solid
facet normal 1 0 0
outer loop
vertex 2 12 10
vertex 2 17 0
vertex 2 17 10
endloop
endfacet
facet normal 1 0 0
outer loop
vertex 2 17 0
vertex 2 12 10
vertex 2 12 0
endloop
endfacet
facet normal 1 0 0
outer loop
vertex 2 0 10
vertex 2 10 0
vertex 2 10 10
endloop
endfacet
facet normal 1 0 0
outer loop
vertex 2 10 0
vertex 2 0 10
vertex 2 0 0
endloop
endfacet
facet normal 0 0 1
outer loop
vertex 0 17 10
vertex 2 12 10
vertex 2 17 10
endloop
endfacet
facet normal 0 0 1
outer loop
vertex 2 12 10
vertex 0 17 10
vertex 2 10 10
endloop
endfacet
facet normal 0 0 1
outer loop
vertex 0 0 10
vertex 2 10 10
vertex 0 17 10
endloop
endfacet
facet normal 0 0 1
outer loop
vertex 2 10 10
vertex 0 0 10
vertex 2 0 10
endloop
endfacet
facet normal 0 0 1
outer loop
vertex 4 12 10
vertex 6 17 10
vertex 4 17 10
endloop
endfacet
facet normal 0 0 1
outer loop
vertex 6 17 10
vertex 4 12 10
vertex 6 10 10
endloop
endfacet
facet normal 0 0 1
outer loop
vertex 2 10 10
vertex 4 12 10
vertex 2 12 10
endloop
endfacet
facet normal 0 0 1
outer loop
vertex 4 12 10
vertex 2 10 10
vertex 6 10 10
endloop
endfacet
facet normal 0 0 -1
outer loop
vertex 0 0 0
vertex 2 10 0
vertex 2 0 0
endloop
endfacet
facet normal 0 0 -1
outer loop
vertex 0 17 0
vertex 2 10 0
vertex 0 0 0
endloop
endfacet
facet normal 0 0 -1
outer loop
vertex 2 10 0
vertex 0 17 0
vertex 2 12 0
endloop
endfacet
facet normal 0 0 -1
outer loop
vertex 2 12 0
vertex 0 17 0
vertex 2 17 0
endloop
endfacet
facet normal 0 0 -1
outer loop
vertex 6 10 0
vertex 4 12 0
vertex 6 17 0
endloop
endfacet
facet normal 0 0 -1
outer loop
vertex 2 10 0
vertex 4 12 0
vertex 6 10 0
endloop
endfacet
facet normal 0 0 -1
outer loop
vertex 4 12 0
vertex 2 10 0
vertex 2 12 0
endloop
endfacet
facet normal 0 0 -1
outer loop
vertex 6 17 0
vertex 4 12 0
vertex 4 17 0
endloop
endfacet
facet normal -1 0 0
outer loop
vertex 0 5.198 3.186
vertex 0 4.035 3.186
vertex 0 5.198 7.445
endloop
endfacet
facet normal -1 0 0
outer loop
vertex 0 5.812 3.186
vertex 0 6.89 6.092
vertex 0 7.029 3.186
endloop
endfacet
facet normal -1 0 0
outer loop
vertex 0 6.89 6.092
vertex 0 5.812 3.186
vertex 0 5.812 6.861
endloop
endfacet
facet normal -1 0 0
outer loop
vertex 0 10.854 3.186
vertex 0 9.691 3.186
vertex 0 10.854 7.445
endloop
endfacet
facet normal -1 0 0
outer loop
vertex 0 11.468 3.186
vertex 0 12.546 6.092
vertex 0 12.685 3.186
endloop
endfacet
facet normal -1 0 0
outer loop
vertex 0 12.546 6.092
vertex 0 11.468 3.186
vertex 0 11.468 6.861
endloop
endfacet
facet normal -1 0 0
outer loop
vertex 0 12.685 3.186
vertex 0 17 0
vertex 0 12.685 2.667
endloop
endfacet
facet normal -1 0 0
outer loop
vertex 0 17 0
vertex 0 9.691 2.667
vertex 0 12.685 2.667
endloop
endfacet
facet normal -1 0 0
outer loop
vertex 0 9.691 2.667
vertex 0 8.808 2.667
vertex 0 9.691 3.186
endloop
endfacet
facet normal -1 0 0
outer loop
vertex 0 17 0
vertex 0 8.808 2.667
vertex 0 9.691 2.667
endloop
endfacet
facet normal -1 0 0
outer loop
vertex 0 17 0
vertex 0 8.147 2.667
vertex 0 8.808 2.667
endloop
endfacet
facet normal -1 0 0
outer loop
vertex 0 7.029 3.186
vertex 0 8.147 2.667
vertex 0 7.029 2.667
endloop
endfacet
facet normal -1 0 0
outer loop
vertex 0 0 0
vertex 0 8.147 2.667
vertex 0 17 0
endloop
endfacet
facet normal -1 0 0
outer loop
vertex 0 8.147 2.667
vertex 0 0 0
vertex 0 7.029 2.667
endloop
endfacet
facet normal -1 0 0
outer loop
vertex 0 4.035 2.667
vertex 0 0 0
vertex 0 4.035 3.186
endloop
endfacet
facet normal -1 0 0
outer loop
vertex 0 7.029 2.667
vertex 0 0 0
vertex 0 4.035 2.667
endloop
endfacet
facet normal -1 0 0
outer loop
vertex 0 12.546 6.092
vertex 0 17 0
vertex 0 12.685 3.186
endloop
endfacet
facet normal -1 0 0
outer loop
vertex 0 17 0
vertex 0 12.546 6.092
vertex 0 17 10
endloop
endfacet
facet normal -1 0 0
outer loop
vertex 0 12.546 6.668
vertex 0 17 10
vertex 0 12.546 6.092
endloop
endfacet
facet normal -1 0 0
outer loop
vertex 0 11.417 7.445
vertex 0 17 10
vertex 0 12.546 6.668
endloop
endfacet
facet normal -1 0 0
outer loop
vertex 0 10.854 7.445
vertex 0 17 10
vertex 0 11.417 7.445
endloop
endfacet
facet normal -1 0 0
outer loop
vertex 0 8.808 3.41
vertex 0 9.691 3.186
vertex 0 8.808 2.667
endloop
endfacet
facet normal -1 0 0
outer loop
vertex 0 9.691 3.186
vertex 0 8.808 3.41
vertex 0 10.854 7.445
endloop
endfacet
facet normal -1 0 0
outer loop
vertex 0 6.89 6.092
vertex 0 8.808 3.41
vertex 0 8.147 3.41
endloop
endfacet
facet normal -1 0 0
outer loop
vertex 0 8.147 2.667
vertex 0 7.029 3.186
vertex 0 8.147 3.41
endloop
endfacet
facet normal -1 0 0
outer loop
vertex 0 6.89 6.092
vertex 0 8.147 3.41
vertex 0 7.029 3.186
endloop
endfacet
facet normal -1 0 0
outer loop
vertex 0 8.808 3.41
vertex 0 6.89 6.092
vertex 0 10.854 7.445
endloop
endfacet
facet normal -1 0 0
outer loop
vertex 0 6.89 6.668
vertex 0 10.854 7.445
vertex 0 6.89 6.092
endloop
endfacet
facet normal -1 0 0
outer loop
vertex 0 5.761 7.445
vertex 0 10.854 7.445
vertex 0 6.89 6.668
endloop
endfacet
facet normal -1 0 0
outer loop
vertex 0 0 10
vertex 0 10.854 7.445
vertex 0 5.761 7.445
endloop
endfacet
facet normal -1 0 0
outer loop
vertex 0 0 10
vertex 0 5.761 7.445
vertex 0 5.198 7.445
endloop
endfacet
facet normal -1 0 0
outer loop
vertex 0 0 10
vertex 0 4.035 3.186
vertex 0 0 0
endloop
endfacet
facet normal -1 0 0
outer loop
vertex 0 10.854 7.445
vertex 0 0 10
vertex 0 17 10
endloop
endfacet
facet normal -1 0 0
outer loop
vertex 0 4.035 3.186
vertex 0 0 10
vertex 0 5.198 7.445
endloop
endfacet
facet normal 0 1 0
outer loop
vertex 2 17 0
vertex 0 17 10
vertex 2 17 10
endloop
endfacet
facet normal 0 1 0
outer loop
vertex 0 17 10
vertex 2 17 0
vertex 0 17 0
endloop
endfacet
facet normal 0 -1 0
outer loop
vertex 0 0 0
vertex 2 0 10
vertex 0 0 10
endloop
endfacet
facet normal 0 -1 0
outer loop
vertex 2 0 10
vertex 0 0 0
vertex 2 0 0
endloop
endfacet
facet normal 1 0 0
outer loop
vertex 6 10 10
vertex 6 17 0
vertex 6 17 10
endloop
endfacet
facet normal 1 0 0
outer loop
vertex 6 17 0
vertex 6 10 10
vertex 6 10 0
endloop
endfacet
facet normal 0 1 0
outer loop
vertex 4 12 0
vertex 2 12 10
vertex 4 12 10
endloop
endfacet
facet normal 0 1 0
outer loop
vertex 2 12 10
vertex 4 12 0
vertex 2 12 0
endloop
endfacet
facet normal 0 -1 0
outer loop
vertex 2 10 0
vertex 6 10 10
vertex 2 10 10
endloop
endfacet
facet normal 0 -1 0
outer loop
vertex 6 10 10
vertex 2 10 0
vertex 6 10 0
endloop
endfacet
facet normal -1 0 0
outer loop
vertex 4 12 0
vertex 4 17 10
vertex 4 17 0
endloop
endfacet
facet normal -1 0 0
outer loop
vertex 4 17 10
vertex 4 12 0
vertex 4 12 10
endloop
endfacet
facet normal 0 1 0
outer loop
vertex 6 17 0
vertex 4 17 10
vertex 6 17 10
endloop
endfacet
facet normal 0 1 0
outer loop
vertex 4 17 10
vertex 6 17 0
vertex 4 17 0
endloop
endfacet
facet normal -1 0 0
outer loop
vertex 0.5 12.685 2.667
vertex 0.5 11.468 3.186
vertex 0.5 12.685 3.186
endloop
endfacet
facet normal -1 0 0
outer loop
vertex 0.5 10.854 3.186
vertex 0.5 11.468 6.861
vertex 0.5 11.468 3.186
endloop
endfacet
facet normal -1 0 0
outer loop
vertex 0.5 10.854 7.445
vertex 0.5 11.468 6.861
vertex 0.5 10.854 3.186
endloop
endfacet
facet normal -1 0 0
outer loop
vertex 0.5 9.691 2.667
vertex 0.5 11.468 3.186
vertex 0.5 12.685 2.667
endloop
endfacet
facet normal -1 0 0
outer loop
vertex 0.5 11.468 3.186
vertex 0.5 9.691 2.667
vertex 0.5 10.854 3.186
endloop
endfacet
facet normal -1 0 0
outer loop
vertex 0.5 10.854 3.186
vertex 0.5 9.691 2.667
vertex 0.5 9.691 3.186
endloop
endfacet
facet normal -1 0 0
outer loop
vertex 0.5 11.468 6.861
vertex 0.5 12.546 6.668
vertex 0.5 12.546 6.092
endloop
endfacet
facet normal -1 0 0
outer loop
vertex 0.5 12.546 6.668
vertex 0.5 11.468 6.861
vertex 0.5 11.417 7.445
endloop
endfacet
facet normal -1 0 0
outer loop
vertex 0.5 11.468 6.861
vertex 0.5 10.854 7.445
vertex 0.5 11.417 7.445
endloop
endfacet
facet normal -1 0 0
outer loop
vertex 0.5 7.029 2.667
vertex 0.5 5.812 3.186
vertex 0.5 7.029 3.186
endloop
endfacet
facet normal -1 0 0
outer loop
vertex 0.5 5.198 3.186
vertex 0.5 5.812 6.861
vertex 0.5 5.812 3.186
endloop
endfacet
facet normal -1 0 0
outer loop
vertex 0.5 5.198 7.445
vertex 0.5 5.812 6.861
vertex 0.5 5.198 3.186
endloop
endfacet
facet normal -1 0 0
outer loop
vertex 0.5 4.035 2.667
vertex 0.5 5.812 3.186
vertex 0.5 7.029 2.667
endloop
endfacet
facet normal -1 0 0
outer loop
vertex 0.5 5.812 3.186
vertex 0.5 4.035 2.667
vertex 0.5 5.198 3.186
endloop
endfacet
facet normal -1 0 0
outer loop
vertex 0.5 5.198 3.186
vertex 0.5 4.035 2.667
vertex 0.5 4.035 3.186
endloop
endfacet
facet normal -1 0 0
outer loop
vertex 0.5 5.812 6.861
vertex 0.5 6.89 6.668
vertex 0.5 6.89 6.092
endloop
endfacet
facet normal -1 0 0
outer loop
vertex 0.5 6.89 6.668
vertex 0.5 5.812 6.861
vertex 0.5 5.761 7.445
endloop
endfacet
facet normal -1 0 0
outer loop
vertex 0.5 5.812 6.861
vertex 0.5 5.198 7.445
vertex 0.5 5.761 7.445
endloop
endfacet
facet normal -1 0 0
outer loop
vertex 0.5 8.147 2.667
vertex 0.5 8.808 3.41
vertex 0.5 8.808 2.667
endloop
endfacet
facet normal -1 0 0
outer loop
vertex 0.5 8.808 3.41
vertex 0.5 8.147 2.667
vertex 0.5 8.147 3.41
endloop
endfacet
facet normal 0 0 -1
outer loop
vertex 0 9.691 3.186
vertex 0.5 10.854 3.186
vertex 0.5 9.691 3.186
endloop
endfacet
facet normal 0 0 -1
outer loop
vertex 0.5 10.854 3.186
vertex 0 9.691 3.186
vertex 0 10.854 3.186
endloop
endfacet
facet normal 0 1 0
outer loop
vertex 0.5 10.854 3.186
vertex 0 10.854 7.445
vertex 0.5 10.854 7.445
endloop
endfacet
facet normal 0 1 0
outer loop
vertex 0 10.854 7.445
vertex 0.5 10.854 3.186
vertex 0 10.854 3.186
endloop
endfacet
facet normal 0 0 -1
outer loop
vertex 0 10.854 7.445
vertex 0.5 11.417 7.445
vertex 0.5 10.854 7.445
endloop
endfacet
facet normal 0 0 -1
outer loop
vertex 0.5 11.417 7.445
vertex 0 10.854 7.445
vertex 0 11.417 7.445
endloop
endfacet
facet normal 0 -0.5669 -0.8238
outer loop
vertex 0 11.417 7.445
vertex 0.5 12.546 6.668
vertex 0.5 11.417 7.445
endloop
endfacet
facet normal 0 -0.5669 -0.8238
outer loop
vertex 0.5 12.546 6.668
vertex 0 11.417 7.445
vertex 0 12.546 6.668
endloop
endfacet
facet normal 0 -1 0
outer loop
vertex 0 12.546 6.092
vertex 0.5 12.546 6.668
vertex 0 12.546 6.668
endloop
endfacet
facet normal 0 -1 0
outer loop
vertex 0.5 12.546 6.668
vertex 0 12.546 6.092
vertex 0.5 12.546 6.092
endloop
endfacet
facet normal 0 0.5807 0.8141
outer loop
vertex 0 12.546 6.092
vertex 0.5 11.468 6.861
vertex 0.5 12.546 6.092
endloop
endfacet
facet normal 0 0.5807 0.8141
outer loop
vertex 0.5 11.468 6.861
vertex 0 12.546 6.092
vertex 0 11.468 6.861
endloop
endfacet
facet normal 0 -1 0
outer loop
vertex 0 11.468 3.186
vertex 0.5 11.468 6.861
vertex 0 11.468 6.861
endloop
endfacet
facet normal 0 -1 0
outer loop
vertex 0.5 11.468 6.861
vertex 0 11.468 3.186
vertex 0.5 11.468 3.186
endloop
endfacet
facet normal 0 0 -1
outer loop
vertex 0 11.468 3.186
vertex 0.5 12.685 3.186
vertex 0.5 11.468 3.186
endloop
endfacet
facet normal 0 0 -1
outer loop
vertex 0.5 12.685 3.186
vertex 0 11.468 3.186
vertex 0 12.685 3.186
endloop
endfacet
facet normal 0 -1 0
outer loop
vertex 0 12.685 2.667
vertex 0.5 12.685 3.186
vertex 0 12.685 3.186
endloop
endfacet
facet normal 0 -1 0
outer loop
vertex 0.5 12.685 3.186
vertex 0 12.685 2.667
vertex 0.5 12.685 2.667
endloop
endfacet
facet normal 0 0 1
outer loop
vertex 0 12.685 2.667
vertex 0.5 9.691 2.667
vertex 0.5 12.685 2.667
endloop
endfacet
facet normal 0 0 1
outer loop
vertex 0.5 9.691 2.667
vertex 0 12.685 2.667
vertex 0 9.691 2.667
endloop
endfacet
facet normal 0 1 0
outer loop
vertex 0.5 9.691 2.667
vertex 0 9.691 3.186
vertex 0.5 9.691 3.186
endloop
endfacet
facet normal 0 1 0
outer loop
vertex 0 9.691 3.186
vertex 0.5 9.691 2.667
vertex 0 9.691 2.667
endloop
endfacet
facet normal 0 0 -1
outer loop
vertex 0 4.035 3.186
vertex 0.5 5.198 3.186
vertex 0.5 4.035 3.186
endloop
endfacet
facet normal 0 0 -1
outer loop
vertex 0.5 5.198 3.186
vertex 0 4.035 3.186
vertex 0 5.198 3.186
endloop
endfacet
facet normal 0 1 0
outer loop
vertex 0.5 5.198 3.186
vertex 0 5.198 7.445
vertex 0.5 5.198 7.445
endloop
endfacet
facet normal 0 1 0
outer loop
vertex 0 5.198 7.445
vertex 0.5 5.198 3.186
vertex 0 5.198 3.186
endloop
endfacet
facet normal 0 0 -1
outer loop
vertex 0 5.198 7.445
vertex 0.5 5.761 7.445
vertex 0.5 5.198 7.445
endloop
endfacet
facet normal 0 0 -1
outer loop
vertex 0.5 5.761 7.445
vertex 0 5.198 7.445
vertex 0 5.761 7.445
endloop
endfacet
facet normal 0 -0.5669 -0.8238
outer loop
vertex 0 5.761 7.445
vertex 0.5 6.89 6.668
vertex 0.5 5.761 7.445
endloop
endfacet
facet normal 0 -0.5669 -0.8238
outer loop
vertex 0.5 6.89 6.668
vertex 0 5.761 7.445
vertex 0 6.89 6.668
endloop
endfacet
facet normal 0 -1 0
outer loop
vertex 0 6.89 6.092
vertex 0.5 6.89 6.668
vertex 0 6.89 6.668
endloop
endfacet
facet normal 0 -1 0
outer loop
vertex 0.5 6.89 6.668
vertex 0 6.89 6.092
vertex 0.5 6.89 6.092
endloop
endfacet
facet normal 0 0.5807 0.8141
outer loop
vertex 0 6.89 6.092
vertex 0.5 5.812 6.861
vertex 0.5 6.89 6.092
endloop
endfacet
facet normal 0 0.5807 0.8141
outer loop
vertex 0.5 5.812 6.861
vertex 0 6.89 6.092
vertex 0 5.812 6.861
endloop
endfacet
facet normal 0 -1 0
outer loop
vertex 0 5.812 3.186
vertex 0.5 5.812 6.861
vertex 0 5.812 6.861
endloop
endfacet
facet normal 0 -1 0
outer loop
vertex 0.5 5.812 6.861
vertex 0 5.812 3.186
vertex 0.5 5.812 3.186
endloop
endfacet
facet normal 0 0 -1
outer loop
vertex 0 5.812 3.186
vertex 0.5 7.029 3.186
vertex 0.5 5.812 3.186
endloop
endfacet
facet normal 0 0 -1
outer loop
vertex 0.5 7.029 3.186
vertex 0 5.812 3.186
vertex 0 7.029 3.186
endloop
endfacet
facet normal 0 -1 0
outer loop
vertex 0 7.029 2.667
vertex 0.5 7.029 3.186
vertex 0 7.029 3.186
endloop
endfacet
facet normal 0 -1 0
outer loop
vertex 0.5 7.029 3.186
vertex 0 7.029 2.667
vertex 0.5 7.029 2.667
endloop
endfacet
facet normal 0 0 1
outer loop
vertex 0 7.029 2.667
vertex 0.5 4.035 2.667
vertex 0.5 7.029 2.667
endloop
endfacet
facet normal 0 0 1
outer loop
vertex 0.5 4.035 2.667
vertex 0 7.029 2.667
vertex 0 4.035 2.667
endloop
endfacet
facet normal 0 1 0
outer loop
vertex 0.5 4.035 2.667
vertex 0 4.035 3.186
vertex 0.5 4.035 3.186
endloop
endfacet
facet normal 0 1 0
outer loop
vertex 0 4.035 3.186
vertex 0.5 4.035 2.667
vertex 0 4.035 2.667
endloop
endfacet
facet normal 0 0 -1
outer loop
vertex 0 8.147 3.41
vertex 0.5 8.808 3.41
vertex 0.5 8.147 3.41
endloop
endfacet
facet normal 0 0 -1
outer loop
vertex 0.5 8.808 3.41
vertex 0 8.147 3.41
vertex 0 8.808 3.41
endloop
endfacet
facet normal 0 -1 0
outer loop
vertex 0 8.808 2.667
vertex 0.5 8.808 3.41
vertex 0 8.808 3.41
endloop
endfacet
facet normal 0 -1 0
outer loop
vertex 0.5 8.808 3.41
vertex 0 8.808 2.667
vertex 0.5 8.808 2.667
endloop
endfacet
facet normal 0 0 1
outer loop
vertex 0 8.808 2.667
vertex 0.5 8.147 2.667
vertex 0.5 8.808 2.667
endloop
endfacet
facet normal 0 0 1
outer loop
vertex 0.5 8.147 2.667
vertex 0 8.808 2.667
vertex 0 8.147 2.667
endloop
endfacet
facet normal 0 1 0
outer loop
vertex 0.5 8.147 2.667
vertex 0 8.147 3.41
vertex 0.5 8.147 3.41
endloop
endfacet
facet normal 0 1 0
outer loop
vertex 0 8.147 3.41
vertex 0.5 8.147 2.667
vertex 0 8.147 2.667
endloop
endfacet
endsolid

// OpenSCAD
width = 5; // x
layerThickness = 2; // y
depth = layerThickness * 3; // 

height = 10;

shortFingerLength = 5;
longFingerLength = shortFingerLength * 2;

overallLength = shortFingerLength + layerThickness + longFingerLength;

difference() {
    union() {
        // spine
        cube ([layerThickness, overallLength, height]); 
        
        // offset
        translate ([0, longFingerLength, 0])
            cube ([depth, layerThickness, height]);
        
        // finger
        translate ([layerThickness * 2, longFingerLength, 0])
            cube ([layerThickness, shortFingerLength + layerThickness, height]);
    }

    versionNumber();
}



version = "1.1";

module versionNumber() {
    translate([0.5, overallLength/2,height/2])
    rotate([90,0,-90])
    linear_extrude (1) {
    text(version, , 5, halign = "center", valign = "center");
    }
}
